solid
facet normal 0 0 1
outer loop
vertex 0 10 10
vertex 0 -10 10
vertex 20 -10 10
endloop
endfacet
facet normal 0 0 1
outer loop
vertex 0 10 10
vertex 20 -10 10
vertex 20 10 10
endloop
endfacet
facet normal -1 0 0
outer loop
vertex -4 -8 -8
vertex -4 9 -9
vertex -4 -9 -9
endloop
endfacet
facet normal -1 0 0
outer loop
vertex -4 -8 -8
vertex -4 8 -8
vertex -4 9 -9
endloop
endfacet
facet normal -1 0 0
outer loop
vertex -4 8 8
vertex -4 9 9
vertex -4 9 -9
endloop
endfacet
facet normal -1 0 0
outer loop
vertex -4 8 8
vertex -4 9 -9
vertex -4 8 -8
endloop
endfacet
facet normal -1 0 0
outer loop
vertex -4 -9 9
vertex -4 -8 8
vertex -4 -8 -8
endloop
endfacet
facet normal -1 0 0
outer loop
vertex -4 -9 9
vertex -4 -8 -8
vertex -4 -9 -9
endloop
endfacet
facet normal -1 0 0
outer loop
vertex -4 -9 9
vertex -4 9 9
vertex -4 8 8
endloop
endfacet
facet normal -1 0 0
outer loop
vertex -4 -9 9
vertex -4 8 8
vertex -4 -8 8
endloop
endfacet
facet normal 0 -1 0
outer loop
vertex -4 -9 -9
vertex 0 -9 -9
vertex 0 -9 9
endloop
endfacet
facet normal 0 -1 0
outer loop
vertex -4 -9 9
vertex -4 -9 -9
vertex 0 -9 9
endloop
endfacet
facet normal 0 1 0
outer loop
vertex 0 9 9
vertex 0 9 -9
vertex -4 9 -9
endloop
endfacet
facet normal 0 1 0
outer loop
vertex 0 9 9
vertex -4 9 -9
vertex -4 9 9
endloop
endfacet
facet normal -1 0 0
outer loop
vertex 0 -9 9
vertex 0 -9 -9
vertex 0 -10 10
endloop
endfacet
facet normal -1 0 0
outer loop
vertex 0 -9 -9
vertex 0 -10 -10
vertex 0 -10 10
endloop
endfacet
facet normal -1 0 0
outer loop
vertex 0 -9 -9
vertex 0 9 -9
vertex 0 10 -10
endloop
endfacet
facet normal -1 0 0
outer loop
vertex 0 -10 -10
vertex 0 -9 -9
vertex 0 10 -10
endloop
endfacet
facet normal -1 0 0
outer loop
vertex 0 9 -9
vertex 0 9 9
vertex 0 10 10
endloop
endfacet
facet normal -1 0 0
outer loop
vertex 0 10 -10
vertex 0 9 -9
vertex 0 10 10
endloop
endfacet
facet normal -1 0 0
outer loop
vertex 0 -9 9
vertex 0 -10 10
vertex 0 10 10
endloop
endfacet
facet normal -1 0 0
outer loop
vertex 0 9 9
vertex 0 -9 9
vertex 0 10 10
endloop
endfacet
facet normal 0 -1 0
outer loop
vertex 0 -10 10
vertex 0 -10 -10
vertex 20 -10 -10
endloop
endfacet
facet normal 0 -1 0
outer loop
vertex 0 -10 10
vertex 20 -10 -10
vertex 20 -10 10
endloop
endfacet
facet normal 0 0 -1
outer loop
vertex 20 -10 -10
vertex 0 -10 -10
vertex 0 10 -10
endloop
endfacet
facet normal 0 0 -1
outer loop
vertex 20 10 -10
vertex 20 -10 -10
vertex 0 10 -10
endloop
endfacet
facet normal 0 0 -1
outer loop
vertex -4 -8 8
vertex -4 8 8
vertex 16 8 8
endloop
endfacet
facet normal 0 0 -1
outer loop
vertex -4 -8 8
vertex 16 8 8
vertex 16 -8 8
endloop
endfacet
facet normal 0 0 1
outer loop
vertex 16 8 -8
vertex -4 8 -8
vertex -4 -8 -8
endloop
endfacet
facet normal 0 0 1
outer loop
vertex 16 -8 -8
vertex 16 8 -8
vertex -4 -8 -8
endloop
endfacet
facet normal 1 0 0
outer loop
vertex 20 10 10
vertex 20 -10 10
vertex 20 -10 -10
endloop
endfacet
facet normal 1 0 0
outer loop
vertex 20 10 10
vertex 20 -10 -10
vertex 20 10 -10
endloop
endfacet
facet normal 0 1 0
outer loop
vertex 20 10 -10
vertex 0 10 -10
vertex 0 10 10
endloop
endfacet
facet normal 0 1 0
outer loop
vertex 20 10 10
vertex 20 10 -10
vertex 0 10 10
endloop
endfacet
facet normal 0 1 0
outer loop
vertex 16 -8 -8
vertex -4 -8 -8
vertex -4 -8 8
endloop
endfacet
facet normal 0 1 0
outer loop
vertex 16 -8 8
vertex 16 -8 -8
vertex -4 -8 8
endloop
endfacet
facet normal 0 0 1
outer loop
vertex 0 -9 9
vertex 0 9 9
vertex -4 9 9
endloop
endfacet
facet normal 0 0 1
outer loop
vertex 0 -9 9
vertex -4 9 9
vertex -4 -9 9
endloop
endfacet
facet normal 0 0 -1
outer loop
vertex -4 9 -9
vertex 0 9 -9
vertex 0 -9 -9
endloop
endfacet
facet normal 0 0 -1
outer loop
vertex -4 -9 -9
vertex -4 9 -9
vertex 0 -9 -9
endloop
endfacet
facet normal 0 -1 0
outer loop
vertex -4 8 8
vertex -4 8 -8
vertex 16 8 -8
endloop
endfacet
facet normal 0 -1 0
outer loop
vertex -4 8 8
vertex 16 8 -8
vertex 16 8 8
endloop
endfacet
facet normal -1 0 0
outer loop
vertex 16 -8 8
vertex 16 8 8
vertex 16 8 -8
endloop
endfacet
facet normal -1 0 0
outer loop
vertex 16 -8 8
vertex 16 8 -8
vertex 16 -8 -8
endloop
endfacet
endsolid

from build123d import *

# Parameters (mm, degrees)
F0_W     = 20
F0_H     = 20
F1_DEPTH = 20
F2_W     = 16
F2_H     = 16
F3_DEPTH = 16
F4_W     = 18
F4_H     = 18
F4_W_2   = 16
F4_H_2   = 16
F5_DEPTH = 4


with BuildPart() as f1:
    # F0 (on Right) → F1 (new body)
    with BuildSketch(Plane.YZ):
        Rectangle(F0_W, F0_H)
    extrude(amount=F1_DEPTH)

    # F2 (on face) → F3 (cut)
    with BuildSketch(Plane(origin=(0, 0, 0), x_dir=(0, -1, 0), z_dir=(-1, 0, 0))):
        Rectangle(F2_W, F2_H)
    extrude(amount=-F3_DEPTH, mode=Mode.SUBTRACT)

    # F4 (on face) → F5 (join)
    with BuildSketch(Plane(origin=(0, 0, 0), x_dir=(0, -1, 0), z_dir=(-1, 0, 0))):
        Rectangle(F4_W, F4_H)
        Rectangle(F4_W_2, F4_H_2, mode=Mode.SUBTRACT)
    extrude(amount=F5_DEPTH)


solid = f1.part
